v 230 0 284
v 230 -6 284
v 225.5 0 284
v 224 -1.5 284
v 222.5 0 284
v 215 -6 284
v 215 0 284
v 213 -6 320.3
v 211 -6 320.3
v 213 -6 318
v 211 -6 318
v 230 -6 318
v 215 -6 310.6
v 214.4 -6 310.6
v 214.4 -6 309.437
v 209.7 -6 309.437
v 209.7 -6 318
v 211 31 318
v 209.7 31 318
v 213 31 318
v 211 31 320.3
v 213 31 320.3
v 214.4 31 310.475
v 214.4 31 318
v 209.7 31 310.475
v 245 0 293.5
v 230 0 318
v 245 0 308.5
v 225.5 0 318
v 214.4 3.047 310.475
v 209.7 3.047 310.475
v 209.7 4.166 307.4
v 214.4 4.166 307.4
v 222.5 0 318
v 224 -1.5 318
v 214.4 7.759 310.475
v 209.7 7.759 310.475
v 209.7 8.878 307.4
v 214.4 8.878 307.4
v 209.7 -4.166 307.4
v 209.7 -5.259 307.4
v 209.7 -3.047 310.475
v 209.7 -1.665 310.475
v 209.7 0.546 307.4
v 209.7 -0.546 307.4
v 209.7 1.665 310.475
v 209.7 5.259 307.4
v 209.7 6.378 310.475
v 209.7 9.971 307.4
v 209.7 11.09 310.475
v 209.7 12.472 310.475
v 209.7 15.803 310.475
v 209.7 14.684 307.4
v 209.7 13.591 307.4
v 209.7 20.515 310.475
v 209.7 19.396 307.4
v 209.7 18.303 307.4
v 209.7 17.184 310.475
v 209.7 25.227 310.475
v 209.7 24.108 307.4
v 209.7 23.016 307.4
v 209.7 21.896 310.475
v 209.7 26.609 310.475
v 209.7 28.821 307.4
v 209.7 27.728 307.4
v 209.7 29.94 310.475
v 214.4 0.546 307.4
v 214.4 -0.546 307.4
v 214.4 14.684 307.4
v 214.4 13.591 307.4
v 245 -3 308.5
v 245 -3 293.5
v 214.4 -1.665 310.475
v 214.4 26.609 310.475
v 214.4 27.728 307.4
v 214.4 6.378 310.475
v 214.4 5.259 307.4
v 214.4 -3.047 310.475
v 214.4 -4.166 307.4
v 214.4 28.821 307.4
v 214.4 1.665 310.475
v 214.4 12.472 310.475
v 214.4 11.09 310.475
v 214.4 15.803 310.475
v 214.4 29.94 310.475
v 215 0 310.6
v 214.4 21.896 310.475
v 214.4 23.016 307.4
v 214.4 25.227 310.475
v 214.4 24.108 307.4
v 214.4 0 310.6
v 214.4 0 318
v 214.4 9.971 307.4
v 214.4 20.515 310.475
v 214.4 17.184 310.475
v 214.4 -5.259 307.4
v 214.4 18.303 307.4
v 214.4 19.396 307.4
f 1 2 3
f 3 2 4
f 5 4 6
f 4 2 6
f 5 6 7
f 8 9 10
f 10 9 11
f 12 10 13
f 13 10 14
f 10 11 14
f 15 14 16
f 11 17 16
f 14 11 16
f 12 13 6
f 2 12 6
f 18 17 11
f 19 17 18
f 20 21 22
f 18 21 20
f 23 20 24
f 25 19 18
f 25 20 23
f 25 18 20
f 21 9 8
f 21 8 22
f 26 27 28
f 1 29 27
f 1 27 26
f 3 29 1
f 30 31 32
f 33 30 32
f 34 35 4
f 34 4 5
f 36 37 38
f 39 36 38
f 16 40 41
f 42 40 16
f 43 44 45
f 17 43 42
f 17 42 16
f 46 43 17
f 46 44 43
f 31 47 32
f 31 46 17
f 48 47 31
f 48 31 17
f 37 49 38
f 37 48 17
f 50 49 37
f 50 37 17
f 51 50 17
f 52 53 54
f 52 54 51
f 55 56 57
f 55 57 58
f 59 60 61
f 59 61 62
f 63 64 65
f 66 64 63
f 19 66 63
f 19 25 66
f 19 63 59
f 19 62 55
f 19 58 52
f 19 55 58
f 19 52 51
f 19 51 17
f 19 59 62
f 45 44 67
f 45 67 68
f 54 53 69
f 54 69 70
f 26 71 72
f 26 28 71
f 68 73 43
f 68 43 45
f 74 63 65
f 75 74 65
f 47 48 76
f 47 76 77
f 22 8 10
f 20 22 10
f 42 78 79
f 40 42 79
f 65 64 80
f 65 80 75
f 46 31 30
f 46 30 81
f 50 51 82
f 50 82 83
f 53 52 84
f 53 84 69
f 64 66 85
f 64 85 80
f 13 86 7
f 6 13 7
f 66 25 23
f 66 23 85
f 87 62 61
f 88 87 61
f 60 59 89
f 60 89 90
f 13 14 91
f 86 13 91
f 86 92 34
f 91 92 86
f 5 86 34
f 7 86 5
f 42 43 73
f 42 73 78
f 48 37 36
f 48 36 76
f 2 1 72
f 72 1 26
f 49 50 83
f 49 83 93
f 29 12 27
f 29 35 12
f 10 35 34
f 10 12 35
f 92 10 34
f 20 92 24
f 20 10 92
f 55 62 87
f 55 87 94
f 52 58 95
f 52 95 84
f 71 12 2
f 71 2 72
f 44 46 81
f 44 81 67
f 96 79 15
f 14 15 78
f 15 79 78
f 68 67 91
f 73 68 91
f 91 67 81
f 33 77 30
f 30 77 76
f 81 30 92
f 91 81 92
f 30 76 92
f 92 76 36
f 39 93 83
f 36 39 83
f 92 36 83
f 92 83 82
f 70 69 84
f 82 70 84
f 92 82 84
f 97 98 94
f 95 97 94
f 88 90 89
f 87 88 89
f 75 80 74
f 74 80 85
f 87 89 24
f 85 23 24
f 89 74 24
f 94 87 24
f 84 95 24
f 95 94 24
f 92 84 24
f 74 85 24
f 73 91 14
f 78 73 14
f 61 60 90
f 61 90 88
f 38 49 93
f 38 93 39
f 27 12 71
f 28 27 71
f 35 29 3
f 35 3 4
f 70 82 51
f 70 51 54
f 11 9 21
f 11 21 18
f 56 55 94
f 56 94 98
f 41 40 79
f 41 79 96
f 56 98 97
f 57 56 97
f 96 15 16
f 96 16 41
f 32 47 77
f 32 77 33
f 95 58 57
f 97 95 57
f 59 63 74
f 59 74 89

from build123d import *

# Parameters (mm, degrees)
BOSS_EXTRUDE1_DEPTH = 4.7
SKETCH2_W           = 2.4
SKETCH2_H           = 37
BOSS_EXTRUDE2_DEPTH = 2
SKETCH3_W           = 7.4
SKETCH3_H           = 6
BOSS_EXTRUDE3_DEPTH = 0.8
SKETCH4_W           = 31
SKETCH4_H           = 6
BOSS_EXTRUDE4_DEPTH = 30
CUT_EXTRUDE4_DEPTH  = 4.7
SKETCH9_W           = 3
SKETCH9_H           = 6
BOSS_EXTRUDE6_DEPTH = 30
CUT_EXTRUDE5_DEPTH  = 405.447882922
CUT_EXTRUDE6_DEPTH  = 405.447882922
CUT_EXTRUDE7_DEPTH  = 6.5


with BuildPart() as part:
    # Sketch1 → Boss-Extrude1 (new body)
    with BuildSketch(Plane(origin=(209.7, 0, 0), x_dir=(0, 0, -1), z_dir=(1, 0, 0))):
        Polygon((-318, -6), (-318, 31), (-310.475, 31), (-310.475, 30.0599), (-307.4, 28.9407), (-307.4, 27.608), (-310.475, 26.4888), (-310.475, 25.3475), (-307.4, 24.2283), (-307.4, 22.8956), (-310.475, 21.7764), (-310.475, 20.6351), (-307.4, 19.5159), (-307.4, 18.1832), (-310.475, 17.064), (-310.475, 15.9227), (-307.4, 14.8035), (-307.4, 13.4708), (-310.475, 12.3516), (-310.475, 11.2103), (-307.4, 10.0911), (-307.4, 8.7584), (-310.475, 7.6392), (-310.475, 6.4979), (-307.4, 5.3787), (-307.4, 4.0461), (-310.475, 2.9268), (-310.475, 1.7855), (-307.4, 0.6663), (-307.4, -0.6663), (-310.475, -1.7855), (-310.475, -2.9268), (-307.4, -4.0461), (-307.4, -5.3787), (-309.1069, -6), align=None)
    extrude(amount=BOSS_EXTRUDE1_DEPTH)

    # Sketch2 → Boss-Extrude2 (add)
    with BuildSketch(Plane(origin=(211, 0, 0), x_dir=(0, 0, -1), z_dir=(1, 0, 0))):
        with Locations((-319.1, 12.5)):
            Rectangle(SKETCH2_W, SKETCH2_H)
    extrude(amount=BOSS_EXTRUDE2_DEPTH)

    # Sketch3 → Boss-Extrude3 (add)
    with BuildSketch(Plane(origin=(214.4, 0, 0), x_dir=(0, 0, -1), z_dir=(1, 0, 0))):
        with Locations((-314.3, -3)):
            Rectangle(SKETCH3_W, SKETCH3_H)
    extrude(amount=BOSS_EXTRUDE3_DEPTH)

    # Sketch4 → Boss-Extrude4 (add)
    with BuildSketch(Plane(origin=(215, 0, 0), x_dir=(0, 0, -1), z_dir=(1, 0, 0))):
        with Locations((-302.5, -3)):
            Rectangle(SKETCH4_W, SKETCH4_H)
    extrude(amount=BOSS_EXTRUDE4_DEPTH)

    # Sketch8 → Cut-Extrude4 (cut, symmetric)
    with BuildSketch(Plane(origin=(209.7, 0, 0), x_dir=(0, 0, -1), z_dir=(1, 0, 0))):
        Polygon((-307, -4.1716), (-310.475, -2.907), (-310.475, -3.047), (-307, -4.3116), align=None)
        Polygon((-307, -5.2532), (-310.475, -6.5178), (-310.475, -6.3778), (-307, -5.1132), align=None)
        Polygon((-307, 0.5408), (-310.475, 1.8054), (-310.475, 1.6654), (-307, 0.4008), align=None)
        Polygon((-307, -0.5408), (-310.475, -1.8054), (-310.475, -1.6654), (-307, -0.4008), align=None)
        Polygon((-307, 5.2532), (-310.475, 6.5178), (-310.475, 6.3778), (-307, 5.1132), align=None)
        Polygon((-307, 4.1716), (-310.475, 2.907), (-310.475, 3.047), (-307, 4.3116), align=None)
        Polygon((-307, 9.9656), (-310.475, 11.2302), (-310.475, 11.0902), (-307, 9.8256), align=None)
        Polygon((-307, 8.884), (-310.475, 7.6194), (-310.475, 7.7594), (-307, 9.024), align=None)
        Polygon((-307, 14.678), (-310.475, 15.9426), (-310.475, 15.8026), (-307, 14.538), align=None)
        Polygon((-307, 13.5964), (-310.475, 12.3318), (-310.475, 12.4718), (-307, 13.7364), align=None)
        Polygon((-307, 19.3904), (-310.475, 20.655), (-310.475, 20.515), (-307, 19.2504), align=None)
        Polygon((-307, 18.3088), (-310.475, 17.0442), (-310.475, 17.1842), (-307, 18.4488), align=None)
        Polygon((-307, 24.1027), (-310.475, 25.3673), (-310.475, 25.2274), (-307, 23.9628), align=None)
        Polygon((-307, 23.0211), (-310.475, 21.7565), (-310.475, 21.8965), (-307, 23.1611), align=None)
        Polygon((-307, 28.8151), (-310.475, 30.0797), (-310.475, 29.9397), (-307, 28.6751), align=None)
        Polygon((-307, 27.7335), (-310.475, 26.4689), (-310.475, 26.6089), (-307, 27.8735), align=None)
    extrude(amount=CUT_EXTRUDE4_DEPTH, both=True, mode=Mode.SUBTRACT)

    # Sketch9 → Boss-Extrude6 (add)
    with BuildSketch(Plane(origin=(215, 0, 0), x_dir=(0, 0, -1), z_dir=(1, 0, 0))):
        with Locations((-285.5, -3)):
            Rectangle(SKETCH9_W, SKETCH9_H)
    extrude(amount=BOSS_EXTRUDE6_DEPTH)

    # Sketch10 → Cut-Extrude5 (cut, through all)
    with BuildSketch(Plane.XY):
        Polygon((227.5, -6.5), (246.5, -2.7), (246.5, -6.5), align=None)
    extrude(amount=CUT_EXTRUDE5_DEPTH, mode=Mode.SUBTRACT)

    # Sketch11 → Cut-Extrude6 (cut, through all)
    with BuildSketch(Plane.XY):
        Polygon((222, 0.5), (226, 0.5), (224, -1.5), align=None)
    extrude(amount=CUT_EXTRUDE6_DEPTH, mode=Mode.SUBTRACT)

    # Sketch12 → Cut-Extrude7 (cut, symmetric)
    with BuildSketch(Plane(origin=(0, 0, 0), x_dir=(1, 0, 0), z_dir=(0, 1, 0))):
        Polygon((228.125, -319.1875), (246.5, -307.55), (246.5, -319.1875), align=None)
        Polygon((228.125, -282.8125), (246.5, -294.45), (246.5, -282.8125), align=None)
    extrude(amount=CUT_EXTRUDE7_DEPTH, both=True, mode=Mode.SUBTRACT)


solid = part.part
